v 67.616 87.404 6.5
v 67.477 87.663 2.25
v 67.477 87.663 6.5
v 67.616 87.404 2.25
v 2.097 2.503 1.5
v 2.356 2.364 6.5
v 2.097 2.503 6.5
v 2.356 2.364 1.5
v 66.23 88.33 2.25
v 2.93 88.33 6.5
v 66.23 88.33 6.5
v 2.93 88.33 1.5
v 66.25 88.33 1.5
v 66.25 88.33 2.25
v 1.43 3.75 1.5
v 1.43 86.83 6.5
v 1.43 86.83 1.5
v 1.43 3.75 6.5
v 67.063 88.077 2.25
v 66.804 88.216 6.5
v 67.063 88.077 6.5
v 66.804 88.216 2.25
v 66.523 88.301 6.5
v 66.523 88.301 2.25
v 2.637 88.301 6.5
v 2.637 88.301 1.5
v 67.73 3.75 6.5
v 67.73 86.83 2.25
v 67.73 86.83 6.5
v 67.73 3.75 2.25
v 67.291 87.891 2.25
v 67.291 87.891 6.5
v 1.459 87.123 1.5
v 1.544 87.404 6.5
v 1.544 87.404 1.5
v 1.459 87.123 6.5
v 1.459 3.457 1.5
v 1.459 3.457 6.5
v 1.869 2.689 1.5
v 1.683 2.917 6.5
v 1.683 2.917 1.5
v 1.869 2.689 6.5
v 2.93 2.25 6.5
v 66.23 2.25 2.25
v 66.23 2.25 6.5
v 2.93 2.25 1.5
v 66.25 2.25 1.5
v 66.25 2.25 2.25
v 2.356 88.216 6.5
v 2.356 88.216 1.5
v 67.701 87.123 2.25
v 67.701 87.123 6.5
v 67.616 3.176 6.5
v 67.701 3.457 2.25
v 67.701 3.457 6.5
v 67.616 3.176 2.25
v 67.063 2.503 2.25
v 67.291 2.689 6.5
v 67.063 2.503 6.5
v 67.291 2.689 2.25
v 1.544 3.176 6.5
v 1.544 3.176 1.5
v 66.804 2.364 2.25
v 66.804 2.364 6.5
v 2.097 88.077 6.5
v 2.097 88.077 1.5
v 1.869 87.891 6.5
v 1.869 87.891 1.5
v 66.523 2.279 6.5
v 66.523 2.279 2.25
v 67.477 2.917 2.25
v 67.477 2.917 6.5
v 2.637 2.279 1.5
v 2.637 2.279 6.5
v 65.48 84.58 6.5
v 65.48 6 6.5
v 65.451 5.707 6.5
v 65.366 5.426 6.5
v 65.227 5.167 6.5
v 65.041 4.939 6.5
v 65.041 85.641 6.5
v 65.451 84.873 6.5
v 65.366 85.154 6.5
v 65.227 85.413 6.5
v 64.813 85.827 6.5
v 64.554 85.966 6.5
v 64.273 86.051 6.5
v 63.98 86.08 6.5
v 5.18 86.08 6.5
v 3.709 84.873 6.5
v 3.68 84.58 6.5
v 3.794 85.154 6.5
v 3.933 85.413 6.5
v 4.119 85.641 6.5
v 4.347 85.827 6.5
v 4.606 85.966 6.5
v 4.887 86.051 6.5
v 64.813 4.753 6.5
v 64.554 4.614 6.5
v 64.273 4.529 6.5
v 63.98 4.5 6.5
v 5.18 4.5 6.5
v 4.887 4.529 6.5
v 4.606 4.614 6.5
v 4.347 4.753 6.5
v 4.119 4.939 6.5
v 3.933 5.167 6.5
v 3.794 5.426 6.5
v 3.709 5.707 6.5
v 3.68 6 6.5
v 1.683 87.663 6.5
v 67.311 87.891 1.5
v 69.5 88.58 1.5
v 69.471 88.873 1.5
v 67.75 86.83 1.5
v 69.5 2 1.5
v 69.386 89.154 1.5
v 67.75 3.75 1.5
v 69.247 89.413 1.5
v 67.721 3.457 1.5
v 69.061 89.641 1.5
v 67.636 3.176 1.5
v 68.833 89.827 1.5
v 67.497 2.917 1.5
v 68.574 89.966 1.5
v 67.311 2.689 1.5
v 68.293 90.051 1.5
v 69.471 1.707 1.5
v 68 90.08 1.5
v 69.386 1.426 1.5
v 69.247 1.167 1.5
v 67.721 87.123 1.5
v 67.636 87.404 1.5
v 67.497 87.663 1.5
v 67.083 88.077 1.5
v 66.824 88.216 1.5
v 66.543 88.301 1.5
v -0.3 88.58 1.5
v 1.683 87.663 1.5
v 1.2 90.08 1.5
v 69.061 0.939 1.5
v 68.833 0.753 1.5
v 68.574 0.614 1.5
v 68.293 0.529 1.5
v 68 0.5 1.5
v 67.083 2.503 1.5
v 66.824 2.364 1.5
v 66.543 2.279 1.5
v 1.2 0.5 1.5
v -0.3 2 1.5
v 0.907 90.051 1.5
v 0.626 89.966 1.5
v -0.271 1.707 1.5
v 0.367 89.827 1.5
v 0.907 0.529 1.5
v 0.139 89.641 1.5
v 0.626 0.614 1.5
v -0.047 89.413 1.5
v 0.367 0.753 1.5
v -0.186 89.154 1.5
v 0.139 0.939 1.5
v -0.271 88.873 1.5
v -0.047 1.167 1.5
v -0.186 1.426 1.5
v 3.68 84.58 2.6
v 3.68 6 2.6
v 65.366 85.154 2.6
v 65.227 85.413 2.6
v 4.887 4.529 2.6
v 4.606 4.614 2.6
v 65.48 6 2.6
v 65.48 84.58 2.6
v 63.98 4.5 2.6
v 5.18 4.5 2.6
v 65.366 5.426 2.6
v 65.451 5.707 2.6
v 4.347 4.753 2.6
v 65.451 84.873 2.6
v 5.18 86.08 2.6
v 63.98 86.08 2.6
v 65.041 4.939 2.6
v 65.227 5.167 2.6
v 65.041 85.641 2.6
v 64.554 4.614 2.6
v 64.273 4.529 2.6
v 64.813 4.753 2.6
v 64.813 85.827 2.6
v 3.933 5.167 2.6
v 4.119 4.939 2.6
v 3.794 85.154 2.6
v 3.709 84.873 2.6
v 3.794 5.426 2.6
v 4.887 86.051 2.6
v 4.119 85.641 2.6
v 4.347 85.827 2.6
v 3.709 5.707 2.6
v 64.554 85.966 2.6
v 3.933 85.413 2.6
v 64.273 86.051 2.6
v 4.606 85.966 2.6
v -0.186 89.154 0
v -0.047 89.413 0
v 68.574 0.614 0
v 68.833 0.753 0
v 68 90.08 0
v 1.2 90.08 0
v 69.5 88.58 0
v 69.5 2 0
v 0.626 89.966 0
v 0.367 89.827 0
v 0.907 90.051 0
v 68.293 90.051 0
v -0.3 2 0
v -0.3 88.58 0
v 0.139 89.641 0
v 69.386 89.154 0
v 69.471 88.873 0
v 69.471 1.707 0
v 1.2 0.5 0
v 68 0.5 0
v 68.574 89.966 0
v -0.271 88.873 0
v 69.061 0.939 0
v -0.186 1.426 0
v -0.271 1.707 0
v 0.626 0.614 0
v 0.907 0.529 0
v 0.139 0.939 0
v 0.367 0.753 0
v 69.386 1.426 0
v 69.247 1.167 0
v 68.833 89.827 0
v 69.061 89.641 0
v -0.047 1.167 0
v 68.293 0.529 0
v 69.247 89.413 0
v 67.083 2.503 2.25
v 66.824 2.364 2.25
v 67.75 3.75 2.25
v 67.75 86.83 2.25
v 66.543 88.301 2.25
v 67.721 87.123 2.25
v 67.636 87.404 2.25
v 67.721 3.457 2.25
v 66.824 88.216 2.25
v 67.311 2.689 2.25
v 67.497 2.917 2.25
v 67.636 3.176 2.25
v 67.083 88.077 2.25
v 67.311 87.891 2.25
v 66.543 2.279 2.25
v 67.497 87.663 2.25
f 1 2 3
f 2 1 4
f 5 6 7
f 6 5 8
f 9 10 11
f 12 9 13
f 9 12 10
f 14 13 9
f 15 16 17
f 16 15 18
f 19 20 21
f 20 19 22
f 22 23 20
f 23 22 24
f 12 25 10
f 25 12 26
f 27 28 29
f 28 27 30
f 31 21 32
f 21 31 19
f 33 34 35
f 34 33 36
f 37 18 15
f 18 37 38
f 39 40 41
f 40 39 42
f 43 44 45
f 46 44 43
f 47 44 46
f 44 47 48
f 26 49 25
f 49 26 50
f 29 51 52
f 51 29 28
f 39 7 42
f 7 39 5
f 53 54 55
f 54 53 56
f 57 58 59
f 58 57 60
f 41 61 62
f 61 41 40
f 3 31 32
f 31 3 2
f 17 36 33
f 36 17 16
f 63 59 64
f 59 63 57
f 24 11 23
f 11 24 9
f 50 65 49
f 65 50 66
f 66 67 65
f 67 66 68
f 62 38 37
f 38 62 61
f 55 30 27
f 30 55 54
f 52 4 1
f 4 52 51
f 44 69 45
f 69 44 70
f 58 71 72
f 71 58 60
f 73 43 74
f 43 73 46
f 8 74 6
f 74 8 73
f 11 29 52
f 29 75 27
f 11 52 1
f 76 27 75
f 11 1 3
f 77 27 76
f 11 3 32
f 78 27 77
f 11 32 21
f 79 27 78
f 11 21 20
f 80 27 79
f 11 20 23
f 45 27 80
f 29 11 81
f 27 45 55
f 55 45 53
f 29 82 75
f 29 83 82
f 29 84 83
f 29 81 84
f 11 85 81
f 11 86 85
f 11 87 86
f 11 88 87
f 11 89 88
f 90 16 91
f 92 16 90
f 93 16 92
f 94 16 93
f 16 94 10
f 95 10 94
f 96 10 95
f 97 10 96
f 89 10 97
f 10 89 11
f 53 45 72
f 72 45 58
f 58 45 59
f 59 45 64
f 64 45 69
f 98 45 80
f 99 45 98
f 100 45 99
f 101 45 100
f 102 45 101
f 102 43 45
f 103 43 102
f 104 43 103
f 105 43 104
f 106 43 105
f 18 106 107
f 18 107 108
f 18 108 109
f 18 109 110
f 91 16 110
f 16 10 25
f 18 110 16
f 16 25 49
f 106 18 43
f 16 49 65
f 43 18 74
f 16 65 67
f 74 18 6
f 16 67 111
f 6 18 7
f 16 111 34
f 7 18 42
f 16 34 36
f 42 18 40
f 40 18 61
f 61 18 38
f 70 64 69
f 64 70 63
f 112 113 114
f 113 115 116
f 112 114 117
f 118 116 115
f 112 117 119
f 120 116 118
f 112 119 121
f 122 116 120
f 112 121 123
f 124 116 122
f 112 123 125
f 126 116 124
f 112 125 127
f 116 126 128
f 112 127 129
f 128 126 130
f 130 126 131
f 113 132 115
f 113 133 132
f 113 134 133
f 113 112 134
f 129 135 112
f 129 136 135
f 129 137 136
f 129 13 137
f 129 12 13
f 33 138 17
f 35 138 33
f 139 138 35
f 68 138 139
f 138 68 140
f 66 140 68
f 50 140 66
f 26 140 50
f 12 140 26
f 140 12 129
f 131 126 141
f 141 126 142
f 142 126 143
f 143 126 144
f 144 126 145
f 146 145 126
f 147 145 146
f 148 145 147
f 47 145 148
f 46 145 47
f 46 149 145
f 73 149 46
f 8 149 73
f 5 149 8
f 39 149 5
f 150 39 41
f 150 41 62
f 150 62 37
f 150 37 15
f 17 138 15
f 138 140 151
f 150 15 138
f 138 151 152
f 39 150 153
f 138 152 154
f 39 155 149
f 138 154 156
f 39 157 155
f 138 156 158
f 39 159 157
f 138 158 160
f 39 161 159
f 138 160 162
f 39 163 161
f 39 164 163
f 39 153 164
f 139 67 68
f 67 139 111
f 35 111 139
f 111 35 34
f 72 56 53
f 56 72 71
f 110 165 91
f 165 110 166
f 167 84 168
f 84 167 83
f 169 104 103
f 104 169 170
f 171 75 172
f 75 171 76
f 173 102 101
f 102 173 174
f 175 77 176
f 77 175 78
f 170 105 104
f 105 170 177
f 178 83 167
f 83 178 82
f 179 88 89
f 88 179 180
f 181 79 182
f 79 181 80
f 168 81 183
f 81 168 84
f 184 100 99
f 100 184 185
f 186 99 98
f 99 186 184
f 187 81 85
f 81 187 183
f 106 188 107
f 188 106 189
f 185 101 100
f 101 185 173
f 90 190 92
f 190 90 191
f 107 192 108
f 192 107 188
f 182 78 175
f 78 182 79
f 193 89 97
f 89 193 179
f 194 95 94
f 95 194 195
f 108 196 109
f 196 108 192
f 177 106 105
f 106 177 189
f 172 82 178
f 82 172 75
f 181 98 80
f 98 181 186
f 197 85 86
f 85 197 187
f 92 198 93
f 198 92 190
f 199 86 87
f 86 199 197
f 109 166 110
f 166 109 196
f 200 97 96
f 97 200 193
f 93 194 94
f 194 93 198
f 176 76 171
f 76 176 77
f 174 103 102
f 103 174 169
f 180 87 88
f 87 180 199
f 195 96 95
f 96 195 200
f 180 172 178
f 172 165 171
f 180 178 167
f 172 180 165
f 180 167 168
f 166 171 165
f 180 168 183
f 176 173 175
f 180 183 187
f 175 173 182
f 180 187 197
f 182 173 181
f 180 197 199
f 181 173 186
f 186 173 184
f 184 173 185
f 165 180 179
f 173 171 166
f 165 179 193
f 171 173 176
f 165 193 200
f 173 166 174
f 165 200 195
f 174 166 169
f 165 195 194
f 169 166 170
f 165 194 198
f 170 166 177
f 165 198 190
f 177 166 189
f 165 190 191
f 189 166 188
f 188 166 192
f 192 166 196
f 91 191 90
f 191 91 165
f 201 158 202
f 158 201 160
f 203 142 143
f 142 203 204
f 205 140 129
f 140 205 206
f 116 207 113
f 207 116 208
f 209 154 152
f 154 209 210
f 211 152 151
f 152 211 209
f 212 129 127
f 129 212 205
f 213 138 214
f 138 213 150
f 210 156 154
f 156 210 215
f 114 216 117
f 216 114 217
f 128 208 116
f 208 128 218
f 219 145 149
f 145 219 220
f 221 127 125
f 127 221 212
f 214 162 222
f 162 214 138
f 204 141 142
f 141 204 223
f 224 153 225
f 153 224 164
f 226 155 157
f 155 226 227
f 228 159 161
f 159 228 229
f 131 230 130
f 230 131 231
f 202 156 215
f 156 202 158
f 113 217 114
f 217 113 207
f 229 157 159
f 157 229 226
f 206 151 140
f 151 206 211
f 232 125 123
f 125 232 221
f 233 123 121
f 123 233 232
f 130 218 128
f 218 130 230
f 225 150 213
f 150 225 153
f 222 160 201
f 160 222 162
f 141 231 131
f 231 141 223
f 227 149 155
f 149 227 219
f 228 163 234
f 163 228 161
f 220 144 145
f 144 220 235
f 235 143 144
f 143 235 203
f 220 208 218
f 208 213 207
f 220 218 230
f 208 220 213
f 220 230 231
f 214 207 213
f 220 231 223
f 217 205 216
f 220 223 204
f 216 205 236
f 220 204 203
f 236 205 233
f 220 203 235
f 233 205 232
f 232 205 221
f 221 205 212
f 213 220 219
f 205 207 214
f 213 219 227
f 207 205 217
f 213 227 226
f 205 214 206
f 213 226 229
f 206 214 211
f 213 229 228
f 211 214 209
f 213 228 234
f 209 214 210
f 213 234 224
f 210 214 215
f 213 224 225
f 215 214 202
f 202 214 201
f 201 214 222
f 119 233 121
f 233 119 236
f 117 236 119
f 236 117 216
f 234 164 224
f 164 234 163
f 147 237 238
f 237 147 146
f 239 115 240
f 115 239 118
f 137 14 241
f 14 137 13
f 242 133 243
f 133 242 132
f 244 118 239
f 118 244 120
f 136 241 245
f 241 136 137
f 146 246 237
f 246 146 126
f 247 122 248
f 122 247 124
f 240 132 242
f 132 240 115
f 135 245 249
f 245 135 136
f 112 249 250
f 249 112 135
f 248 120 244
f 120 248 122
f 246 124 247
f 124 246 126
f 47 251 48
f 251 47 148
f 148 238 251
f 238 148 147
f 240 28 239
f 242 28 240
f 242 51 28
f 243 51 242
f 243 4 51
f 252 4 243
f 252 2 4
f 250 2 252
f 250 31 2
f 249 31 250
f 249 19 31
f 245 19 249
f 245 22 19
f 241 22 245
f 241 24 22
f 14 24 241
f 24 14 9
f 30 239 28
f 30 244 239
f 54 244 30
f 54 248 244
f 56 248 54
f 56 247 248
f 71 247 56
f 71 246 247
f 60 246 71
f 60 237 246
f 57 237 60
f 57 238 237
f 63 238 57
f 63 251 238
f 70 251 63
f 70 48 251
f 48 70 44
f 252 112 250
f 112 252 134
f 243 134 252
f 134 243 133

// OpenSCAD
// Box for Sensotron by MIKROTRON
// Copyright (c) 2015 MIKROTRON
// Version 0.1 by prexy 29.11.2015.
// Based on Arduino conectors library by Kelly Egan, see the original MIT License below

// Arduino connectors library
//
// Copyright (c) 2013 Kelly Egan
//
// The MIT License (MIT)
//
// Permission is hereby granted, free of charge, to any person obtaining a copy of this software 
// and associated documentation files (the "Software"), to deal in the Software without restriction, 
// including without limitation the rights to use, copy, modify, merge, publish, distribute, sublicense,
// and/or sell copies of the Software, and to permit persons to whom the Software is furnished to do 
// so, subject to the following conditions:
//
// The above copyright notice and this permission notice shall be included in all copies or substantial
// portions of the Software.
//
// THE SOFTWARE IS PROVIDED "AS IS", WITHOUT WARRANTY OF ANY KIND, EXPRESS OR IMPLIED, INCLUDING BUT 
// NOT LIMITED TO THE WARRANTIES OF MERCHANTABILITY, FITNESS FOR A PARTICULAR PURPOSE AND NONINFRINGEMENT. 
// IN NO EVENT SHALL THE AUTHORS OR COPYRIGHT HOLDERS BE LIABLE FOR ANY CLAIM, DAMAGES OR OTHER LIABILITY,
// WHETHER IN AN ACTION OF CONTRACT, TORT OR OTHERWISE, ARISING FROM, OUT OF OR IN CONNECTION WITH THE 
// SOFTWARE OR THE USE OR OTHER DEALINGS IN THE SOFTWARE.
//

/******** Parametrized dimensions, constants, default settings etc. ********/
//Box dimensions:
additional_height=16;   //height that is needed above the base board
additional_length=0; //length that is needed in addition to the base board
brim=4;     //side brim for front and back openings
top_brim=8; //top brim for front and back openings
//Box default settings:
wall_thickness=1.5;    //wall thickness in mm
wall_offset=8;       //how far the walls are from PCB
corner_radius=3;    //controls how rounded are the box corners
//LCD dimensions
LCDwidth=72.5;
LCDdepth=25;
//Connector dimensions
connWidth=24;
connDepth=8;
//Setting for enclosure mounting holes (Not Arduino mounting):
NOMOUNTINGHOLES = 0;
INTERIORMOUNTINGHOLES = 1;
EXTERIORMOUNTINGHOLES = 2;
//Setting for box binding type:
CLIPS=0;
CLICK=1;
//Setting for standoff type:
TAPHOLE = 0;
PIN = 1;
//Setting for PCB bounding box:
BOARD = 0;        //includes all components and PCB
PCB = 1;          //just the PCB
COMPONENTS = 2;   //just the components
//Setting for component IDs:
ALL = -1;
HEADER_F = 0;
HEADER_M = 1;
USB = 2;
POWER = 3;
RJ45 = 4;

//Draws bottom part of Sensobox
//enclosure();

//Draws top part of Sensobox
//enclosureLid();
translate([60, 10, wall_thickness])
rotate([0,180,0]) enclosureLid();


/******************************* BOTTOM PART ************************************/

//Create a board enclosure
module enclosure(boardType = UNO, wall = wall_thickness, offset = wall_offset, heightExtension = additional_height, cornerRadius = corner_radius, mountType = PIN, bindingType=CLICK) {
	standOffHeight = 5;
    
	dimensions = boardDimensions(boardType);
	boardDim = boardDimensions(boardType);
	pcbDim = pcbDimensions(boardType);

	enclosureWidth = pcbDim[0] + (wall + offset) * 2;
	enclosureDepth = pcbDim[1] + (wall + offset) * 2;
	enclosureHeight = boardDim[2] + wall + standOffHeight + heightExtension;

	union() {
        
		difference() {
			//Main box shape
			boundingBox(boardType = boardType, height = enclosureHeight, offset = wall + offset, include=PCB, cornerRadius = wall);
	
			translate([0, 0, wall]) {
				//Interior of box
				boundingBox(boardType = boardType, height = enclosureHeight, offset = offset, include=PCB, cornerRadius = wall);
            
            //Punch outs for USB and POWER
				translate([0, 0, standOffHeight]) {
					components(boardType = boardType, offset = 1, extension = wall + offset + 10);
				}
            //kabel za elektrode
                translate([25, -10, standOffHeight+17.25]){
                    cube(size = 9.2, center = true);
                }
                wext=wall + offset;
                p1i=[wext-1.2, -10, 12+1.7];
                p1o=[wext-1.2, 10, 12+1.7];
                p2i=[9.34+11.06, -10, 17.25+4.6];
                p2o=[9.34+11.06, 10, 17.25+4.6];
                p3i=[25+4.6, -10, 17.25-4.6];
                p3o=[25+4.6, 10, 17.25-4.6];
                p4i=[9.34+13, -10, 0.7];
                p4o=[9.34+13, 10, 0.7];
                translate([0,0, standOffHeight]){
                    polyhedron([p1i,p1o,p2i,p2o,p3i,p3o,p4i,p4o],[[1,3,0],[2,0,3],[2,3,5],[4,2,5],[4,5,6],[6,5,7],[1,0,6],[1,6,7],[4,0,2],[0,4,6],[5,3,7],[7,3,1]]);}
                

            translate([enclosureWidth/2-(wall+offset), enclosureDepth-1.5*wall-offset, enclosureHeight/2+wall+brim]){
                //Back opening for Sensobox
                //cube([enclosureWidth-2*(wall+brim+offset), 5*wall, enclosureHeight], center=true);
            }
		}
    if (bindingType==CLIPS){		
			//Holes for lid clips
			translate([0, enclosureDepth * 0.75 - (offset + wall), enclosureHeight]) {
				translate([-offset, 0, 0])
					rotate([0, 180, 90]) clipHole(clipHeight = 10, holeDepth = wall + 0.2);
				translate([offset + boardDim[0], 0, 0])
					rotate([0, 180, 270]) clipHole(clipHeight = 10, holeDepth = wall + 0.2);
			}
		
			translate([0, enclosureDepth * 0.25 - (offset + wall), enclosureHeight]) {
				translate([-offset, 0, 0])
					rotate([0, 180, 90]) clipHole(clipHeight = 10, holeDepth = wall + 0.2);
				translate([offset + dimensions[0], 0, 0])
					rotate([0, 180, 270]) clipHole(clipHeight = 10, holeDepth = wall + 0.2);
			}	 
    }
		}
		translate([0, 0, wall]) {
			standoffs(boardType = boardType, height = standOffHeight, mountType = mountType);
		}
	}
}

//Create a bounding box around the board
//Offset - will increase the size of the box on each side,
//Height - overides the boardHeight and offset in the z direction
module boundingBox(boardType = UNO, offset = 0, height = 0, cornerRadius = 0, include = BOARD) {
	//What parts are included? Entire board, pcb or just components.
	pos = ([boardPosition(boardType), pcbPosition(boardType), componentsPosition(boardType)])[include];
	dim = ([boardDimensions(boardType), pcbDimensions(boardType), componentsDimensions(boardType)])[include];

	//Depending on if height is set position and dimensions will change
	position = [
				pos[0] - offset, 
				pos[1] - offset, 
				(height == 0 ? pos[2] - offset : pos[2] )
				];

	dimensions = [
				dim[0] + offset * 2, 
				dim[1] + offset * 2, 
				(height == 0 ? dim[2] + offset * 2 : height)
				];

	translate( position ) {
		if( cornerRadius == 0 ) {
			cube( dimensions );
		} else {
			roundedCube( dimensions, cornerRadius=cornerRadius );
		}
	}
}

//Create PCB standoffs on the enclosure bottom
module standoffs( 
	boardType = UNO, 
	height = 10, 
	topRadius = mountingHoleRadius + 1, 
	bottomRadius =  mountingHoleRadius + 2, 
	holeRadius = mountingHoleRadius,
	mountType = TAPHOLE
	) {

	holePlacement(boardType = boardType){
		union() {
			difference() {
				cylinder(r1 = bottomRadius, r2 = topRadius, h = height, $fn=32);
				if( mountType == TAPHOLE ) {
					cylinder(r =  holeRadius, h = height * 4, center = true, $fn=32);
                
				}
			}
			if( mountType == PIN ) {
				translate([0, 0, height - 1])
                cylinder(d=2.5, h=pcbHeight+3, $fn=20); //simple pins by prexy
			}
		}
		cylinder(r1 = bottomRadius, r2 = topRadius, h = height, $fn=32);
    }
}

//This is used for placing the mounting holes and for making standoffs
//child elements will be centered on that chosen boards mounting hole centers
module holePlacement(boardType = UNO ) {
	for(i = boardHoles[boardType] ) {
		translate(i){
            //FIXME: shouldn't be done like this, avoid hardcodig values!
			if (i[0]==50.8) children(1); else children(0);
        }
	}
}

//Creates rounded corners
module roundedCube( dimensions = [10,10,10], cornerRadius = corner_radius, faces=32 ) {
	hull() cornerCylinders( dimensions = dimensions, cornerRadius = cornerRadius, faces=faces ); 
}
module cornerCylinders( dimensions = [10,10,10], cornerRadius = corner_radius, faces=32 ) {
	translate([ cornerRadius, cornerRadius, 0]) {
		cylinder( r = cornerRadius, $fn = faces, h = dimensions[2] );
		translate([dimensions[0] - cornerRadius * 2, 0, 0]) cylinder( r = cornerRadius, $fn = faces, h = dimensions[2] );
		translate([0, dimensions[1] - cornerRadius * 2, 0]) {
			cylinder( r = cornerRadius, $fn = faces, h = dimensions[2] );
			translate([dimensions[0] - cornerRadius * 2, 0, 0]) cylinder( r = cornerRadius, $fn = faces, h = dimensions[2] );
		}
	}
}

//Create a clip that snapps into a clipHole
module clip(clipWidth = 5, clipDepth = 5, clipHeight = 5, lipDepth = 1.5, lipHeight = 3) {
	translate([-clipWidth/2,-(clipDepth-lipDepth),0]) rotate([90, 0, 90])
	linear_extrude(height = clipWidth, convexity = 10)
		polygon(	points=[	[0, 0], 
						[clipDepth - lipDepth, 0],
						[clipDepth - lipDepth, clipHeight - lipHeight],
						[clipDepth - 0.25, clipHeight - lipHeight],
						[clipDepth, clipHeight - lipHeight + 0.25],
						[clipDepth - lipDepth * 0.8, clipHeight],
						[(clipDepth - lipDepth) * 0.3, clipHeight] 
						], 
				paths=[[0,1,2,3,4,5,6,7]]
			);
}

//Hole for clip
module clipHole(clipWidth = 5, clipDepth = 5, clipHeight = 5, lipDepth = 1.5, lipHeight = 3, holeDepth = 5) {
	offset = 0.1;
	translate([-clipWidth/2,-(clipDepth-lipDepth),0])
	translate([-offset, clipDepth - lipDepth-offset, clipHeight - lipHeight - offset])
		cube( [clipWidth + offset * 2, holeDepth, lipHeight + offset * 2] );
}

module mountingHole(screwHeadRad = woodscrewHeadRad, screwThreadRad = woodscrewThreadRad, screwHeadHeight = woodscrewHeadHeight, holeDepth = 10) {
	union() {
		translate([0, 0, -0.01])
			cylinder( r = screwThreadRad, h = 1.02, $fn = 32 );
		translate([0, 0, 1])
			cylinder( r1 = screwThreadRad, r2 = screwHeadRad, h = screwHeadHeight, $fn = 32 );
		translate([0, 0, screwHeadHeight - 0.01 + 1])
			cylinder( r = screwHeadRad, h = holeDepth - screwHeadHeight + 0.02, $fn = 32 );
	}
}


/********************************** TOP PART *************************************/

//Create a snap on lid for enclosure
module enclosureLid( boardType = UNO, wall = wall_thickness, offset = wall_offset, cornerRadius = corner_radius, ventHoles = false, bindingType=CLICK) {
	dimensions = boardDimensions(boardType);
	boardDim = boardDimensions(boardType);
	pcbDim = pcbDimensions(boardType);

	enclosureWidth = pcbDim[0] + (wall + offset) * 2;
	enclosureDepth = pcbDim[1] + (wall + offset) * 2;

    //increase brim a little so that it fits better with the bottom part
    brim=brim*1.1;

	difference() {
		union() {
			boundingBox(boardType = boardType, height = wall, offset = wall + offset, include=PCB, cornerRadius = wall);

		
        translate([0, 0, -wall * 0.5])
                 union(){
                    boundingBox(boardType = boardType, height = wall * 0.5, offset = offset-0.25, include=PCB, cornerRadius = wall);
                    
                    
                }

        if (bindingType==CLIPS){ 
			//Lid clips
			translate([0, enclosureDepth * 0.75 - (offset + wall), 0]) {
				translate([-offset, 0, 0])
					rotate([0, 180, 90]) clip(clipHeight = 10);
				translate([offset + boardDim[0], 0, 0])
					rotate([0, 180, 270]) clip(clipHeight = 10);
			}
		
			translate([0, enclosureDepth * 0.25 - (offset + wall), 0]) {
				translate([-offset, 0, 0])
					rotate([0, 180, 90]) clip(clipHeight = 10);
				translate([offset + dimensions[0], 0, 0])
					rotate([0, 180, 270]) clip(clipHeight = 10);
			}
        } else {
            //CILCK TO FIT by prexy
            translate([dimensions[0]-1.25, 0, 0]) rotate([0, 180, 0])
            difference(){
                boundingBox(boardType = boardType, height = 5, offset = offset-0.25, include=PCB, cornerRadius = wall);
                translate([0,0,1.1]) boundingBox(boardType = boardType, height = 4, offset =offset - 2.5, include=PCB, cornerRadius = wall);
            }
        }
        }
        
	}
}

/******************************** UTILITY FUNCTIONS *******************************/

//Return the length side of a square given its diagonal
function sides( diagonal ) = sqrt(diagonal * diagonal  / 2);

//Return the minimum values between two vectors of either length 2 or 3. 2D Vectors are treated as 3D vectors who final value is 0.
function minVec( vector1, vector2 ) =
	[min(vector1[0], vector2[0]), min(vector1[1], vector2[1]), min((vector1[2] == undef ? 0 : vector1[2]), (vector2[2] == undef ? 0 : vector2[2]) )];

//Return the maximum values between two vectors of either length 2 or 3. 2D Vectors are treated as 3D vectors who final value is 0.
function maxVec( vector1, vector2 ) =
	[max(vector1[0], vector2[0]), max(vector1[1], vector2[1]), max((vector1[2] == undef ? 0 : vector1[2]), (vector2[2] == undef ? 0 : vector2[2]) )];

//Determine the minimum point on a component in a list of components
function minCompPoint( list, index = 0, minimum = [10000000, 10000000, 10000000] ) = 
	index >= len(list) ? minimum : minCompPoint( list, index + 1, minVec( minimum, list[index][0] ));

//Determine the maximum point on a component in a list of components
function maxCompPoint( list, index = 0, maximum = [-10000000, -10000000, -10000000] ) = 
	index >= len(list) ? maximum : maxCompPoint( list, index + 1, maxVec( maximum, list[index][0] + list[index][1]));

//Determine the minimum point in a list of points
function minPoint( list, index = 0, minimum = [10000000, 10000000, 10000000] ) = 
	index >= len(list) ? minimum : minPoint( list, index + 1, minVec( minimum, list[index] ));

//Determine the maximum point in a list of points
function maxPoint( list, index = 0, maximum = [-10000000, -10000000, -10000000] ) = 
	index >= len(list) ? maximum : maxPoint( list, index + 1, maxVec( maximum, list[index] ));

//Returns the pcb position and dimensions
function pcbPosition(boardType = UNO) = minPoint(boardShapes[boardType]);
function pcbDimensions(boardType = UNO) = maxPoint(boardShapes[boardType]) - minPoint(boardShapes[boardType]) + [0, 0, pcbHeight];

//Returns the position of the box containing all components and its dimensions
function componentsPosition(boardType = UNO) = minCompPoint(components[boardType]) + [0, 0, pcbHeight];
function componentsDimensions(boardType = UNO) = maxCompPoint(components[boardType]) - minCompPoint(components[boardType]);

//Returns the position and dimensions of the box containing the pcb board
function boardPosition(boardType = UNO) = 
	minCompPoint([[pcbPosition(boardType), pcbDimensions(boardType)], [componentsPosition(boardType), componentsDimensions(boardType)]]);
function boardDimensions(boardType = UNO) = 
	maxCompPoint([[pcbPosition(boardType), pcbDimensions(boardType)], [componentsPosition(boardType), componentsDimensions(boardType)]]) 
	- minCompPoint([[pcbPosition(boardType), pcbDimensions(boardType)], [componentsPosition(boardType), componentsDimensions(boardType)]]);

/******************************* BOARD SPECIFIC DATA ******************************/
//Board IDs
NG = 0;
DIECIMILA = 1;
DUEMILANOVE = 2;
UNO = 3;
LEONARDO = 4;
MEGA = 5;
MEGA2560 = 6;
DUE = 7;
YUN = 8; 
INTELGALILEO = 9;
TRE = 10;
ETHERNET = 11;

/********************************** MEASUREMENTS **********************************/
pcbHeight = 1.7;
headerWidth = 2.54;
headerHeight = 9;
mountingHoleRadius = 3.2 / 2;

ngWidth = 53.34;
leonardoDepth = 68.58 + 1.1;           //PCB depth plus offset of USB jack (1.1)
ngDepth = 68.58 + 6.5;
megaDepth = 101.6 + 6.5;               //Coding is my business and business is good!
dueDepth = 101.6 + 1.1;

arduinoHeight = 11 + pcbHeight + 0;

/********************************* MOUNTING HOLES *********************************/

//Duemilanove, Diecimila, NG and earlier
ngHoles = [
		[  2.54, 15.24 ],
		[  17.78, 66.04 ],
		[  45.72, 66.04 ]
		];

//Uno, Leonardo holes
unoHoles = [
		[  2.54, 15.24 ],
		[  17.78, 66.04 ],
		[  45.72, 66.04 ],
		[  50.8, 13.97 ]
		];

//Sensotron holes
sensoHoles = [
		[  2.54, 26.74 ],   
		[  17.78, 77.54 ],
		[  45.72, 77.54 ],
		[  50.8, 31.00 ]    //no hole here on Iteaduino!!!! 25.47
		];

//Due and Mega 2560
dueHoles = [
		[  2.54, 15.24 ],
		[  17.78, 66.04 ],
		[  45.72, 66.04 ],
		[  50.8, 13.97 ],
		[  2.54, 90.17 ],
		[  50.8, 96.52 ]
		];

// Original Mega holes
megaHoles = [
		[  2.54, 15.24 ],
		[  50.8, 13.97 ],
		[  2.54, 90.17 ],
		[  50.8, 96.52 ]
		];

boardHoles = [ 
		ngHoles,        //NG
		ngHoles,        //Diecimila
		ngHoles,        //Duemilanove
		unoHoles,     //Uno - changed positions for Sensobox!!!!
		unoHoles,       //Leonardo
		megaHoles,      //Mega
		dueHoles,       //Mega 2560
		dueHoles,       //Due
		0,              //Yun
		0,              //Intel Galileo
       	        0,              //Tre
                unoHoles        //Ethernet
		];

/********************************** BOARD SHAPES **********************************/
ngBoardShape = [ 
		[  0.0, 0.0 ],
		[  53.34, 0.0 ],
		[  53.34, 66.04 ],
		[  50.8, 66.04 ],
		[  48.26, 68.58 ],
		[  15.24, 68.58 ],
		[  12.7, 66.04 ],
		[  1.27, 66.04 ],
		[  0.0, 64.77 ]
		];

sensoBoxBoardShape= [            // izmjene za scrotron
		[  0.0, 0.0 ],
		[  50.34, 0.0 ],
		[  50.34, 66.04 ],
		[  50.8, 66.04 ],
		[  48.26, 70.58 ],
		[  15.24, 70.58 ],
		[  12.7, 66.04 ],
		[  1.27, 66.04 ],
		[  0.0, 64.77 ]
		];

megaBoardShape = [ 
		[  0.0, 0.0 ],
		[  53.34, 0.0 ],
		[  53.34, 99.06 ],
		[  52.07, 99.06 ],
		[  49.53, 101.6 ],
		[  15.24, 101.6 ],
		[  12.7, 99.06 ],
		[  2.54, 99.06 ],
		[  0.0, 96.52 ]
		];

boardShapes = [ 	
		ngBoardShape,   //NG
		ngBoardShape,   //Diecimila
		ngBoardShape,   //Duemilanove
		sensoBoxBoardShape,   //Uno - changed length for Sensobox!!!
		ngBoardShape,   //Leonardo
		megaBoardShape, //Mega
		megaBoardShape, //Mega 2560
		megaBoardShape, //Due
		0,              //Yun
		0,              //Intel Galileo
		0,              //Tre
                ngBoardShape    //Ethernet
		];	

/*********************************** COMPONENTS ***********************************/

//Component data. 
//[position, dimensions, direction(which way would a cable attach), type(header, usb, etc.), color]
ngComponents = [
	[[1.27, 17.526, 0], [headerWidth, headerWidth * 10, headerHeight], [0, 0, 1], HEADER_F, "Black" ],
	[[1.27, 44.45, 0], [headerWidth, headerWidth * 8, headerHeight ], [0, 0, 1], HEADER_F, "Black" ],
	[[49.53, 26.67, 0], [headerWidth, headerWidth * 8, headerHeight ], [0, 0, 1], HEADER_F, "Black" ],
	[[49.53, 49.53, 0], [headerWidth, headerWidth * 6, headerHeight ], [0, 0, 1], HEADER_F, "Black" ],
	[[9.34, -6.5, 0],[12, 16, 11],[0, -1, 0], USB, "LightGray" ],
	[[40.7, -1.8, 0], [9.0, 13.2, 10.9], [0, -1, 0], POWER, "Black" ]
	];

etherComponents = [
	[[1.27, 17.526, 0], [headerWidth, headerWidth * 10, headerHeight], [0, 0, 1], HEADER_F, "Black" ],
	[[1.27, 44.45, 0], [headerWidth, headerWidth * 8, headerHeight ], [0, 0, 1], HEADER_F, "Black" ],
	[[49.53, 26.67, 0], [headerWidth, headerWidth * 8, headerHeight ], [0, 0, 1], HEADER_F, "Black" ],
	[[49.53, 49.53, 0], [headerWidth, headerWidth * 6, headerHeight ], [0, 0, 1], HEADER_F, "Black" ],
	[[7.20, -4.4, 0],[16, 22, 13],[0, -1, 0], RJ45, "Green" ],
	[[40.7, -1.8, 0], [9.0, 13.2, 10.9], [0, -1, 0], POWER, "Black" ]
	];

leonardoComponents = [
	[[1.27, 17.526, 0], [headerWidth, headerWidth * 10, headerHeight], [0, 0, 1], HEADER_F, "Black" ],
	[[1.27, 44.45, 0], [headerWidth, headerWidth * 8, headerHeight ], [0, 0, 1], HEADER_F, "Black" ],
	[[49.53, 26.67, 0], [headerWidth, headerWidth * 8, headerHeight ], [0, 0, 1], HEADER_F, "Black" ],
	[[49.53, 49.53, 0], [headerWidth, headerWidth * 6, headerHeight ], [0, 0, 1], HEADER_F, "Black" ],
	[[11.5, -1.1, 0],[7.5, 5.9, 3],[0, -1, 0], USB, "LightGray" ],
	[[40.7, -1.8, 0], [9.0, 13.2, 10.9], [0, -1, 0], POWER, "Black" ]
	];

megaComponents = [
	[[1.27, 22.86, 0], [headerWidth, headerWidth * 8, headerHeight], [0, 0, 1], HEADER_F, "Black"],
	[[1.27, 44.45, 0], [headerWidth, headerWidth * 8, headerHeight], [0, 0, 1], HEADER_F, "Black"],
	[[1.27, 67.31, 0], [headerWidth, headerWidth * 8, headerHeight], [0, 0, 1], HEADER_F, "Black"],
	[[49.53, 31.75, 0], [headerWidth, headerWidth * 6, headerHeight ], [0, 0, 1], HEADER_F, "Black"],
	[[49.53, 49.53, 0], [headerWidth, headerWidth * 8, headerHeight], [0, 0, 1], HEADER_F, "Black"],
	[[49.53, 72.39, 0], [headerWidth, headerWidth * 8, headerHeight], [0, 0, 1], HEADER_F, "Black"],
	[[1.27, 92.71, 0], [headerWidth * 18, headerWidth * 2, headerHeight], [0, 0, 1], HEADER_F, "Black"],
	[[9.34, -6.5, 0],[12, 16, 11],[0, -1, 0], USB, "LightGray"],
	[[40.7, -1.8, 0], [9.0, 13.2, 10.9], [0, -1, 0], POWER, "Black" ]
	];

mega2560Components = [
	[[1.27, 17.526, 0], [headerWidth, headerWidth * 10, headerHeight], [0, 0, 1], HEADER_F, "Black" ],
	[[1.27, 44.45, 0], [headerWidth, headerWidth * 8, headerHeight], [0, 0, 1], HEADER_F, "Black" ],
	[[1.27, 67.31, 0], [headerWidth, headerWidth * 8, headerHeight], [0, 0, 1], HEADER_F, "Black" ],
	[[49.53, 26.67, 0], [headerWidth, headerWidth * 8, headerHeight ], [0, 0, 1], HEADER_F, "Black" ],
	[[49.53, 49.53, 0], [headerWidth, headerWidth * 8, headerHeight], [0, 0, 1], HEADER_F, "Black" ],
	[[49.53, 72.39, 0], [headerWidth, headerWidth * 8, headerHeight], [0, 0, 1], HEADER_F, "Black" ],
	[[1.27, 92.71, 0], [headerWidth * 18, headerWidth * 2, headerHeight], [0, 0, 1], HEADER_F, "Black" ],
	[[9.34, -6.5, 0],[12, 16, 11],[0, -1, 0], USB, "LightGray" ],
	[[40.7, -1.8, 0], [9.0, 13.2, 10.9], [0, -1, 0], POWER, "Black" ]
	];

dueComponents = [
	[[1.27, 17.526, 0], [headerWidth, headerWidth * 10, headerHeight], [0, 0, 1], HEADER_F, "Black"],
	[[1.27, 44.45, 0], [headerWidth, headerWidth * 8, headerHeight], [0, 0, 1], HEADER_F, "Black"],
	[[1.27, 67.31, 0], [headerWidth, headerWidth * 8, headerHeight], [0, 0, 1], HEADER_F, "Black"],
	[[49.53, 26.67, 0], [headerWidth, headerWidth * 8, headerHeight ], [0, 0, 1], HEADER_F, "Black"],
	[[49.53, 49.53, 0], [headerWidth, headerWidth * 8, headerHeight], [0, 0, 1], HEADER_F, "Black"],
	[[49.53, 72.39, 0], [headerWidth, headerWidth * 8, headerHeight], [0, 0, 1], HEADER_F, "Black"],
	[[1.27, 92.71, 0], [headerWidth * 18, headerWidth * 2, headerHeight], [0, 0, 1], HEADER_F, "Black"],
	[[11.5, -1.1, 0], [7.5, 5.9, 3], [0, -1, 0], USB, "LightGray" ],
	[[27.365, -1.1, 0], [7.5, 5.9, 3], [0, -1, 0], USB, "LightGray" ],
	[[40.7, -1.8, 0], [9.0, 13.2, 10.9], [0, -1, 0], POWER, "Black" ]
	];

components = [
	ngComponents,		//NG
	ngComponents,		//Diecimila
	ngComponents,		//Duemilanove
	ngComponents,		//Uno
	leonardoComponents,	//Leonardo
	megaComponents,		//Mega
	mega2560Components,	//Mega 2560
	dueComponents,   	//Due
	0,                 	//Yun
	0,		        //Intel Galileo
	0,			//Tre
        etherComponents         //Ethernet
	];


/******************************* DEPRECATED ************************************/

//Constructs a roughed out arduino board
//Current only USB, power and headers
module arduino(boardType = UNO) {
	//The PCB with holes
	difference() {
		color("SteelBlue") 
			boardShape( boardType );
		translate([0,0,-pcbHeight * 0.5]) holePlacement(boardType = boardType)
			color("SteelBlue") cylinder(r = mountingHoleRadius, h = pcbHeight * 2, $fn=32);
	}
	//Add all components to board
	components( boardType = boardType, component = ALL );
}

//Creates a bumper style enclosure that fits tightly around the edge of the PCB.
module bumper( boardType = UNO, mountingHoles = false ) {
	bumperBaseHeight = 2;
	bumperHeight = bumperBaseHeight + pcbHeight + 0.5;
	dimensions = boardDimensions(boardType);

	difference() {
		union() {
			//Outer rim of bumper
			difference() {
				boardShape(boardType = boardType, offset=1.4, height = bumperHeight);
				translate([0,0,-0.1])
					boardShape(boardType = boardType, height = bumperHeight + 0.2);
			}

			//Base of bumper	
			difference() {
				boardShape(boardType = boardType, offset=1, height = bumperBaseHeight);
				translate([0,0, -0.1])
					boardShape(boardType = boardType, offset=-2, height = bumperHeight + 0.2);
			}

			//Board mounting holes
			holePlacement(boardType=boardType)
				cylinder(r = mountingHoleRadius + 1.5, h = bumperBaseHeight, $fn = 32);

			//Bumper mounting holes (exterior)
			if( mountingHoles ) {
				difference() {	
					hull() {
						translate([-6, (dimensions[1] - 6) / 2, 0])
							cylinder( r = 6, h = pcbHeight + 2, $fn = 32 );
						translate([ -0.5, dimensions[0] / 2 - 9, 0]) 
							cube([0.5, 12, bumperHeight]);
					}
					translate([-6, (dimensions[0] - 6) / 2, 0])
						mountingHole(holeDepth = bumperHeight);
				}
				difference() {	
					hull() {
						translate([dimensions[0] + 6, (dimensions[1] - 6) / 2,0])
							cylinder( r = 6, h = pcbHeight + 2, $fn = 32 );
						translate([ dimensions[0], dimensions[1] / 2 - 9, 0]) 
							cube([0.5, 12, bumperHeight]);
					}
					translate([dimensions[0] + 6, (dimensions[1] - 6) / 2,0])
						mountingHole(holeDepth = bumperHeight);
				}
			}
		}
		translate([0,0,-0.5])
		holePlacement(boardType=boardType)
			cylinder(r = mountingHoleRadius, h = bumperHeight, $fn = 32);	
		translate([0, 0, bumperBaseHeight]) {
			components(boardType = boardType, component = ALL, offset = 1);
		}
		translate([4,(dimensions[1] - dimensions[1] * 0.4)/2,-1])
			cube([dimensions[0] -8,dimensions[1] * 0.4,bumperBaseHeight + 2]);
	}
}

module vent(length=10) {
    color("Red") cube([length,2,10]);
}

//Offset from board. Negative values are insets
module boardShape( boardType = UNO, offset = 0, height = pcbHeight ) {
	dimensions = boardDimensions(boardType);

	xScale = (dimensions[0] + offset * 2) / dimensions[0];
	yScale = (dimensions[1] + offset * 2) / dimensions[1];

	translate([-offset, -offset, 0])
		scale([xScale, yScale, 1.0])
			linear_extrude(height = height) 
				polygon(points = boardShapes[boardType]);
}

//Places components on board
//  compenent - the data set with a particular component (like boardHeaders)
//  extend - the amount to extend the component in the direction of its socket
//  offset - the amount to increase the components other two boundaries



module components( boardType = UNO, component = ALL, extension = 0, offset = 0 ) {
	translate([0, 0, pcbHeight]) {
		for( i = [0:len(components[boardType]) - 1] ){
			if( components[boardType][i][3] == component || component == ALL) {
				assign( 
					//Calculates position + adjustment for offset and extention  
					position = components[boardType][i][0] - (([1,1,1] - components[boardType][i][2]) * offset)
						+ [	min(components[boardType][i][2][0],0), 
						 	min(components[boardType][i][2][1],0),
	               			min(components[boardType][i][2][2],0) ] * extension,
					//Calculates the full box size including offset and extention
					dimensions = components[boardType][i][1] 
						+ ((components[boardType][i][2] * [1,1,1]) 
							* components[boardType][i][2]) * extension
						+ ([1,1,1] - components[boardType][i][2]) * offset * 2 
					) {					
					translate( position ) color( components[boardType][i][4] ) 
						cube( dimensions );
				}
			}
		}	
	}
}


/****************************** NON-BOARD PARAMETERS ******************************/

//Mounting holes
//woodscrewHeadRad = 4.6228;	//Number 8 wood screw head radius
//woodscrewThreadRad = 2.1336;  	//Number 8 wood screw thread radius
//woodscrewHeadHeight = 2.8448;	//Number 8 wood screw head height
